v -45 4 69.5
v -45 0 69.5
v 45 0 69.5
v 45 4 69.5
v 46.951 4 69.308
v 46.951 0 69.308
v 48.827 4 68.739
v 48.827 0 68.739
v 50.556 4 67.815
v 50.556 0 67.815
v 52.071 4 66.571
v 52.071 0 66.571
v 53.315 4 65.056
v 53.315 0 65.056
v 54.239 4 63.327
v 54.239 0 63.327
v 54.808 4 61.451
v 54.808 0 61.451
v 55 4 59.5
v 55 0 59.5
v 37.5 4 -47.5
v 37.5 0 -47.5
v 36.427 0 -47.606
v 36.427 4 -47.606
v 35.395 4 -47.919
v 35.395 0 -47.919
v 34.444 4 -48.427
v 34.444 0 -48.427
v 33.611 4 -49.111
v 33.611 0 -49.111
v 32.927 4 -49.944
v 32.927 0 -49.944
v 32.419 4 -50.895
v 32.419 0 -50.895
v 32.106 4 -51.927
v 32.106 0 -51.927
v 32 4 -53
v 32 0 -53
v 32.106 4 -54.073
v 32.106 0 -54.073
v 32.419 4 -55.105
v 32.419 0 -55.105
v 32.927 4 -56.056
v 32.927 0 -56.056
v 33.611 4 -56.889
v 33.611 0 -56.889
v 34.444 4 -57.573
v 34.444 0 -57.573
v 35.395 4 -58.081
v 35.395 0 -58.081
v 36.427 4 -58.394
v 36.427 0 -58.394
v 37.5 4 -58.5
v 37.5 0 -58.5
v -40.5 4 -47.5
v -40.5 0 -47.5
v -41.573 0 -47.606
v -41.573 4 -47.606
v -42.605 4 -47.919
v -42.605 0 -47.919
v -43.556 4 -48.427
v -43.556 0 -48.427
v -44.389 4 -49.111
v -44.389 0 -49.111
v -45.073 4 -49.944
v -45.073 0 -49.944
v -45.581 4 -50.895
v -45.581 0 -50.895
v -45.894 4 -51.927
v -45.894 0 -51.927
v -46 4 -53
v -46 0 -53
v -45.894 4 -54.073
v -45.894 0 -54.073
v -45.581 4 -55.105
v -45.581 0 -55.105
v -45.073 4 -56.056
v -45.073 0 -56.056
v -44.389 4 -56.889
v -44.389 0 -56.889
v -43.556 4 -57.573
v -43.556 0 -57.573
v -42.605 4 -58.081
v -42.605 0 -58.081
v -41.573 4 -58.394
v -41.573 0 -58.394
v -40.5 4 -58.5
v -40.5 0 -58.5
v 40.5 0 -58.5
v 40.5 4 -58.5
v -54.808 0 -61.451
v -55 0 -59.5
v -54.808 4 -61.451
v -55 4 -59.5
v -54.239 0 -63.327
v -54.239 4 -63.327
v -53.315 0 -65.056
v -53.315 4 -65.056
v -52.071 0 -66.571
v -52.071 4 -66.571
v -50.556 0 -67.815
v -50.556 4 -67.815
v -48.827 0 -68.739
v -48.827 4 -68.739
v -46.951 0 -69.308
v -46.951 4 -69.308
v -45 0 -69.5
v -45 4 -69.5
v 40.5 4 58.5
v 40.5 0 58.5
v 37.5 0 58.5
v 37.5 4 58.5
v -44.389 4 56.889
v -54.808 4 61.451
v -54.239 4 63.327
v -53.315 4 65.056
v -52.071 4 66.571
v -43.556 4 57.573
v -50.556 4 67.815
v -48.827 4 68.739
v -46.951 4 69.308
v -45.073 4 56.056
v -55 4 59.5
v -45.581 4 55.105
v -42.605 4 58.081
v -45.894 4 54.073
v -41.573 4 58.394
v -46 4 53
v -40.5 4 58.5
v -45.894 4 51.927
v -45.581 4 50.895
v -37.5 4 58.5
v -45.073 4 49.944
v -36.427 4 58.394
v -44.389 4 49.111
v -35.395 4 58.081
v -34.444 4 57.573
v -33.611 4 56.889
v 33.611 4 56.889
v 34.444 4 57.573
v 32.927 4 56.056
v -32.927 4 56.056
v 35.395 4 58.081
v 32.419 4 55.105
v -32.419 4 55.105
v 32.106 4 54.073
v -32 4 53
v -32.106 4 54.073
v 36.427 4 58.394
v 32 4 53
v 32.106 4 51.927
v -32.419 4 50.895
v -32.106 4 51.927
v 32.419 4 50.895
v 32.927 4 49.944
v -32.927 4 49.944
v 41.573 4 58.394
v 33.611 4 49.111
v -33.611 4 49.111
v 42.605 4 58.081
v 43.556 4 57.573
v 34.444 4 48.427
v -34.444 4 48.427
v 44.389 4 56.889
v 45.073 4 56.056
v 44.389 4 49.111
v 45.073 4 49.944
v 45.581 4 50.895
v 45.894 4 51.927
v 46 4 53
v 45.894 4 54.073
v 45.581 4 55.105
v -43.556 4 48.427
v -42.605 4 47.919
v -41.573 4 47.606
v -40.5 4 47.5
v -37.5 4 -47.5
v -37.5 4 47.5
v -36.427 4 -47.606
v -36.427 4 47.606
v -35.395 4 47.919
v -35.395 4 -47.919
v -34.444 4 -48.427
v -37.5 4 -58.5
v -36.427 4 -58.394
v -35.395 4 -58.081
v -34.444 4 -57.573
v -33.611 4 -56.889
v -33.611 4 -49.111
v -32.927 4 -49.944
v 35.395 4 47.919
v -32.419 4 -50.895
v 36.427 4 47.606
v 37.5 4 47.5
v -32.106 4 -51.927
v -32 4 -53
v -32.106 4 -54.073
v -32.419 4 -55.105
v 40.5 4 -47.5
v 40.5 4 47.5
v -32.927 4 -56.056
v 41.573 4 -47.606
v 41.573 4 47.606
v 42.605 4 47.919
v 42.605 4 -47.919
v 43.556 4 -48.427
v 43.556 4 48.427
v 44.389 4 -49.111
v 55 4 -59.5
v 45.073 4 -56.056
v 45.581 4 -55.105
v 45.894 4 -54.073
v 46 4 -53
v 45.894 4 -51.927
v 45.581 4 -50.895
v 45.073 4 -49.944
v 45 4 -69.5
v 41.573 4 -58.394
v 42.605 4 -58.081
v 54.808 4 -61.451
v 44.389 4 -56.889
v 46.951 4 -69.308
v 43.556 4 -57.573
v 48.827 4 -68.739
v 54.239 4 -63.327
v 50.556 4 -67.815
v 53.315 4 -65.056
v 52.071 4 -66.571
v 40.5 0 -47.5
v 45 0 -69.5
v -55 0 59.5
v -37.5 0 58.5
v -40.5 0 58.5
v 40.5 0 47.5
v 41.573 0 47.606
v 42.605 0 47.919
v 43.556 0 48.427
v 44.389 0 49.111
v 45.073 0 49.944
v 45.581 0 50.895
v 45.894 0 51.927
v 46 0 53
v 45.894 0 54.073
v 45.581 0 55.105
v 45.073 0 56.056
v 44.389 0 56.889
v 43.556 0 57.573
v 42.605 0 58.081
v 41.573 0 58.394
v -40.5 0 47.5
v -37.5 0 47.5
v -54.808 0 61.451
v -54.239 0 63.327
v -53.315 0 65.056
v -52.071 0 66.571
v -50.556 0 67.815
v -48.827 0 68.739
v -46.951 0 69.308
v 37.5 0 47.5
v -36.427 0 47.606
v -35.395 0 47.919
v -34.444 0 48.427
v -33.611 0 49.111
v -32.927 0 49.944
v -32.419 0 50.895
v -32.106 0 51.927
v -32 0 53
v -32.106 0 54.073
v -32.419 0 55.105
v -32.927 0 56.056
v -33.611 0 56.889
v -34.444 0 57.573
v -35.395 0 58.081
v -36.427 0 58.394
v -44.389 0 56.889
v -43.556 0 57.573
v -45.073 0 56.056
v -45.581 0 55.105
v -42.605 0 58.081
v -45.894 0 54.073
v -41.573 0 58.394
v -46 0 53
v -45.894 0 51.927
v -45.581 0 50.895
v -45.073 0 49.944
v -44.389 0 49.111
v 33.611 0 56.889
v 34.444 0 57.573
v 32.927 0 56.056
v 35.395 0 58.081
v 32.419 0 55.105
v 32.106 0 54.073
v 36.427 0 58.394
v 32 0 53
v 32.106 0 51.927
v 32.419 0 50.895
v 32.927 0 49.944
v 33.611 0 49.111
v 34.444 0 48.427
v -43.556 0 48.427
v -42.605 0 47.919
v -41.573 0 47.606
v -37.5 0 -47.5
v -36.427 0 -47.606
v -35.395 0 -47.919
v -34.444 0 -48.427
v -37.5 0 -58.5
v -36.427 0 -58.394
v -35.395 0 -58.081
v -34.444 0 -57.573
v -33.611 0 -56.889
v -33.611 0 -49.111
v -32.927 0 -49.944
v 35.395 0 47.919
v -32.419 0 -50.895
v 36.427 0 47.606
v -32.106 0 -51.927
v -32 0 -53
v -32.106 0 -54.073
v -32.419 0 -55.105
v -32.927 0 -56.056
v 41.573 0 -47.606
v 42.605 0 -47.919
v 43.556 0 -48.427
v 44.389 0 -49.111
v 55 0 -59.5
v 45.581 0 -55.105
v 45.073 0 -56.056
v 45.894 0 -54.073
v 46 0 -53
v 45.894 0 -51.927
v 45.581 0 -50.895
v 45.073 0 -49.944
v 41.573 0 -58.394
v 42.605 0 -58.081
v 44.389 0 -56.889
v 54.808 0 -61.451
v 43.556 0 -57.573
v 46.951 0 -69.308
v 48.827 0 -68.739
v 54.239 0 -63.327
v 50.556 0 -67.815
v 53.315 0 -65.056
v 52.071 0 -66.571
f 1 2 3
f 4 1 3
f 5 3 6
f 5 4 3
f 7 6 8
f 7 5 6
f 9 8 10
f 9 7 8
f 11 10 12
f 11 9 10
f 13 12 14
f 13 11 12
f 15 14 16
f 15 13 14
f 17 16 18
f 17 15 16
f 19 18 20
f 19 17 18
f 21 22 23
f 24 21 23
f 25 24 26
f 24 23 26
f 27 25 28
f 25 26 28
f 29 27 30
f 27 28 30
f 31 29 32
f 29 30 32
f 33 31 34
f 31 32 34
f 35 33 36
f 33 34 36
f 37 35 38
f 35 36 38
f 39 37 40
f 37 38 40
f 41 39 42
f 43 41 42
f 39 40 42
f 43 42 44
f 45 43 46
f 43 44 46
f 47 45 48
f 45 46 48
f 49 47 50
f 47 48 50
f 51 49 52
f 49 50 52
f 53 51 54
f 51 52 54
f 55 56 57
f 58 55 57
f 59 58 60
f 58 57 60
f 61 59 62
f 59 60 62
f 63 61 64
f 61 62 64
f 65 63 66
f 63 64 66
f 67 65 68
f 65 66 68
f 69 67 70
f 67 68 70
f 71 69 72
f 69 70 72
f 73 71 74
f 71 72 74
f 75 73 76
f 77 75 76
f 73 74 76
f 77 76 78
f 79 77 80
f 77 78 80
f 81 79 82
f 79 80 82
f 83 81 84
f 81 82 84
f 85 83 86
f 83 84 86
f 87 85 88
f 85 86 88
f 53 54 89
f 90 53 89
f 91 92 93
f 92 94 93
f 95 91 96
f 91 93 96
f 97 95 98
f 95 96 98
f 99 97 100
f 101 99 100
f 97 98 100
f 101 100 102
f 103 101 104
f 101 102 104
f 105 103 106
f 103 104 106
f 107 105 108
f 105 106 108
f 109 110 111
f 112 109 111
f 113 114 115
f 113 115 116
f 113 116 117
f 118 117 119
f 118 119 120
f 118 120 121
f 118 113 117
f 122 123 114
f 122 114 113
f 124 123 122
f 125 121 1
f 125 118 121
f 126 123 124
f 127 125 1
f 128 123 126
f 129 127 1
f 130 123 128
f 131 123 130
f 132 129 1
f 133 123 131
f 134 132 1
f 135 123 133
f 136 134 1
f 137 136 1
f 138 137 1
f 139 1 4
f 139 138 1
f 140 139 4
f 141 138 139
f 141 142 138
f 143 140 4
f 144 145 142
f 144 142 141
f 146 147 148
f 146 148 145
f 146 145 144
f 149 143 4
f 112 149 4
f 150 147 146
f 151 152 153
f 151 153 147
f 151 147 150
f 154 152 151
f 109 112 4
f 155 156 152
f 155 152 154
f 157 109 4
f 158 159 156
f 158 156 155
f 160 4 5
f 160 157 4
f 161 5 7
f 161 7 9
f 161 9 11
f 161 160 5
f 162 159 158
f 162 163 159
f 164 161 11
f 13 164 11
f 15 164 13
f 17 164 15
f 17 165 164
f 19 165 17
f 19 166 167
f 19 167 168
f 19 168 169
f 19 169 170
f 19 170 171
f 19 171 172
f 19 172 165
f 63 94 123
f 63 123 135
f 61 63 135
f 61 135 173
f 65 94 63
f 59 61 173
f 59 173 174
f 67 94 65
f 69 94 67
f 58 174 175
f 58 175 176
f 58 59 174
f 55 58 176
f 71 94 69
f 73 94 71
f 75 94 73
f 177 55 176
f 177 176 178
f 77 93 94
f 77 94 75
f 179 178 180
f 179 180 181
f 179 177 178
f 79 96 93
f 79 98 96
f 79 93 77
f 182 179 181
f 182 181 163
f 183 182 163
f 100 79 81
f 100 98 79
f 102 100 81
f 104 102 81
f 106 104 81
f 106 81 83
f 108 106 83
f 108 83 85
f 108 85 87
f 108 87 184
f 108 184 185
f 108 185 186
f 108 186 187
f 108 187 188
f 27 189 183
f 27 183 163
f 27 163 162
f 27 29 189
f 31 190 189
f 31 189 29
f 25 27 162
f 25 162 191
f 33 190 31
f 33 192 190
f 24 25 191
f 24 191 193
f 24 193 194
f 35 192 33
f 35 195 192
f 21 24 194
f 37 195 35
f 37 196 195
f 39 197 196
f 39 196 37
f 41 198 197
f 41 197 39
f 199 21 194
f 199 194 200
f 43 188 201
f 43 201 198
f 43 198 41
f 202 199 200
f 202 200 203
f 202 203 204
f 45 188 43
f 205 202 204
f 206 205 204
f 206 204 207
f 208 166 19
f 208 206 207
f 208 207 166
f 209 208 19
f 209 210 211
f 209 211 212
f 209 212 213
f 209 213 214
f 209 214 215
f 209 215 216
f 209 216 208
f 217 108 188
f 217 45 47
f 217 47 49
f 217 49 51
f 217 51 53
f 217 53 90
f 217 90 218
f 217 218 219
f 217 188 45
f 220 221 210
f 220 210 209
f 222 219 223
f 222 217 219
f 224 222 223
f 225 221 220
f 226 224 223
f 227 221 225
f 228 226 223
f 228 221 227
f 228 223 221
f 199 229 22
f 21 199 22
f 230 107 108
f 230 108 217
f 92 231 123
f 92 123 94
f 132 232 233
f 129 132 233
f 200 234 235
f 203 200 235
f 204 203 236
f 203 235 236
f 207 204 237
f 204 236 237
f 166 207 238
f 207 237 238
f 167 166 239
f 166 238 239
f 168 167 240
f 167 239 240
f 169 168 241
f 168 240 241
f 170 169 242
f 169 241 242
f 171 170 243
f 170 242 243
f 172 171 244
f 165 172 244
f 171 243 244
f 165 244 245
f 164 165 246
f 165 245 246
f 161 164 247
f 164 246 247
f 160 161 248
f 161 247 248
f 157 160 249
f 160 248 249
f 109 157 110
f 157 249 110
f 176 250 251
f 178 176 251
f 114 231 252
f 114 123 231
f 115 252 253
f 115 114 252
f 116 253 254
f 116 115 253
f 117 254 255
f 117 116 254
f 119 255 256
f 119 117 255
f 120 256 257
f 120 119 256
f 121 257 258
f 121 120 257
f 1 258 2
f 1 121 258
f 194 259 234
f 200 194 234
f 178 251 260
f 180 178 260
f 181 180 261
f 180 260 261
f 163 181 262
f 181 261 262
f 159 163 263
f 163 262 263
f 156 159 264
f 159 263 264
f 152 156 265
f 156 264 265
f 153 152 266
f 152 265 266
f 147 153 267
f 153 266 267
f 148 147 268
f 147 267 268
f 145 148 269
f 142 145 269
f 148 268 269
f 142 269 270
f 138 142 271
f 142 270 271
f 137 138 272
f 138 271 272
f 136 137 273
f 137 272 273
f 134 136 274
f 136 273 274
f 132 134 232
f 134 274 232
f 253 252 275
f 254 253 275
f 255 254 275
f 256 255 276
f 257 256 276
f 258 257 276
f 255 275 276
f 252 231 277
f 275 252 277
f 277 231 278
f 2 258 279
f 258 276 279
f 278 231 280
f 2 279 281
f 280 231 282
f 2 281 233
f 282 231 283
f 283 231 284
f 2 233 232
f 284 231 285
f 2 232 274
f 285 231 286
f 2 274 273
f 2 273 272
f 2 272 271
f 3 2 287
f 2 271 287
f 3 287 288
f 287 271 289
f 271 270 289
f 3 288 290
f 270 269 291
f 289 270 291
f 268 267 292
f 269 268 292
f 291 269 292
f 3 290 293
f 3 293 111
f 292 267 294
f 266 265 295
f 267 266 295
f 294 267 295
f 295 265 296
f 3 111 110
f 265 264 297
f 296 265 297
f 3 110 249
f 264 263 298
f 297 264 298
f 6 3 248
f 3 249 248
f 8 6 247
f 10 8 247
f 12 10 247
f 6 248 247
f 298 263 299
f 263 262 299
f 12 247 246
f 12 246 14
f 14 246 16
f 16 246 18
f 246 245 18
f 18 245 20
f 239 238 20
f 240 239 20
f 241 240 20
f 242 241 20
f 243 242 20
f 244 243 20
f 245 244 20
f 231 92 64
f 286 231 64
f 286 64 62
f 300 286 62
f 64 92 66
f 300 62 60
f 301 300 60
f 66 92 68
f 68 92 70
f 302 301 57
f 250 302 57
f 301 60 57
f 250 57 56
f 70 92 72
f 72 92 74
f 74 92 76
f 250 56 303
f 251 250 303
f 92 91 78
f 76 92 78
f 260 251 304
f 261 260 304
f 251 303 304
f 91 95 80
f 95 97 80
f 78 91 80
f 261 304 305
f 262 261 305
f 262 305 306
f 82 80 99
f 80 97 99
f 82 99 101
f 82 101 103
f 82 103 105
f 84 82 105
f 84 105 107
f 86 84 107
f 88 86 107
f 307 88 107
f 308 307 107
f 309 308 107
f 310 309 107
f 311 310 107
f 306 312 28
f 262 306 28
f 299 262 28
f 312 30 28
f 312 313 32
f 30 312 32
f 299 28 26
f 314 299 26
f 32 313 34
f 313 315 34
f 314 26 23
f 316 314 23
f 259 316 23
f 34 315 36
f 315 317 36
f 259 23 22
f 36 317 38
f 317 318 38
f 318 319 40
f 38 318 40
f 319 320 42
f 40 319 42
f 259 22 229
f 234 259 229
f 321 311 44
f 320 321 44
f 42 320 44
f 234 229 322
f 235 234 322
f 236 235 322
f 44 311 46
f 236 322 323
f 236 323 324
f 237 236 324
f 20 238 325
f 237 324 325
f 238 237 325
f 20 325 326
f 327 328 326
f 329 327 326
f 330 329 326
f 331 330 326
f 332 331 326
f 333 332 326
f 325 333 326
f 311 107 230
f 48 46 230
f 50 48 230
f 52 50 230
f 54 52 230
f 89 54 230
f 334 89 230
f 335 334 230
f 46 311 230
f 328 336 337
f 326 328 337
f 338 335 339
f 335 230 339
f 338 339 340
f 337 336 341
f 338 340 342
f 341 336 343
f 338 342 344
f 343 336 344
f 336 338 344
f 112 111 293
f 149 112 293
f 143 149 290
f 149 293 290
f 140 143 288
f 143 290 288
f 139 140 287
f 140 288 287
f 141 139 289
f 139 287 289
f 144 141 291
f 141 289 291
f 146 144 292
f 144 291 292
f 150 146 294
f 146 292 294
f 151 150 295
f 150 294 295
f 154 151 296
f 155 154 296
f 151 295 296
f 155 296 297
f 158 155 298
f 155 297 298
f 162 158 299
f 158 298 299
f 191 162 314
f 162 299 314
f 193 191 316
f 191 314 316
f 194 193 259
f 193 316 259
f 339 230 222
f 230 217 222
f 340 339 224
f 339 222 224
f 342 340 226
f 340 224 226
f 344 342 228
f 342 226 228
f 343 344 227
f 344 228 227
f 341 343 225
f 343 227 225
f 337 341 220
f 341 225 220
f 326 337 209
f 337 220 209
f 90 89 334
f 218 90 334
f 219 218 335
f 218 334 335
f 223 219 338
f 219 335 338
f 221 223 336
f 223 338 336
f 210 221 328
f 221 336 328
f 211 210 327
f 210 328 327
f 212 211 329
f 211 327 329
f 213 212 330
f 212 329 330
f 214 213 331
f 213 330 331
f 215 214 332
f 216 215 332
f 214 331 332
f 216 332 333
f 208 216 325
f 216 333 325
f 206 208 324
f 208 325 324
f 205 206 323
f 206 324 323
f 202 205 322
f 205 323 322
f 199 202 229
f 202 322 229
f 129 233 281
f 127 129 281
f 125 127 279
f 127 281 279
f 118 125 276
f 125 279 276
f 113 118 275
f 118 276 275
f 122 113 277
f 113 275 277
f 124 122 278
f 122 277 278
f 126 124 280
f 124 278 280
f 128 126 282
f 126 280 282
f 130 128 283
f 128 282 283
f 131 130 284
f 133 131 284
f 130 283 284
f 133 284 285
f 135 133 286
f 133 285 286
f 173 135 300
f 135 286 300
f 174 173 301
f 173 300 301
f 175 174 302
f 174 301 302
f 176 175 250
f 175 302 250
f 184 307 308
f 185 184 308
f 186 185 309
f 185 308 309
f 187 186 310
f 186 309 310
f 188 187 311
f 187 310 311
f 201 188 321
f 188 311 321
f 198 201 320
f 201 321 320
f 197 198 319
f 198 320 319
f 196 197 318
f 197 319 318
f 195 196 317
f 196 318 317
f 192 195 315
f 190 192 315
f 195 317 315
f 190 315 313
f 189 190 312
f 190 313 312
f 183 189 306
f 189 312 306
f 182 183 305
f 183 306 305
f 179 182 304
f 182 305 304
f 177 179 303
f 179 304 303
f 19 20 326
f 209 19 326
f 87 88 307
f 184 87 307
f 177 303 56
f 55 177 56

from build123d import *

# Parameters (mm, degrees)
SKETCH1_W           = 110
SKETCH1_H           = 139
BOSS_EXTRUDE1_DEPTH = 4
FILLET1_R           = 10


with BuildPart() as part:
    # Sketch1 → Boss-Extrude1 (new body)
    with BuildSketch(Plane(origin=(0, 0, 0), x_dir=(1, 0, 0), z_dir=(0, 1, 0))):
        Rectangle(SKETCH1_W, SKETCH1_H)
        with BuildLine():
            Line((-40.5, 58.5), (-37.5, 58.5))
            ThreePointArc((-37.5, 58.5), (-32, 53), (-37.5, 47.5))
            Line((-37.5, 47.5), (-40.5, 47.5))
            ThreePointArc((-40.5, 47.5), (-46, 53), (-40.5, 58.5))
        make_face(mode=Mode.SUBTRACT)
        with BuildLine():
            Line((37.5, 58.5), (40.5, 58.5))
            ThreePointArc((40.5, 58.5), (46, 53), (40.5, 47.5))
            Line((40.5, 47.5), (37.5, 47.5))
            ThreePointArc((37.5, 47.5), (32, 53), (37.5, 58.5))
        make_face(mode=Mode.SUBTRACT)
        with BuildLine():
            Line((-40.5, -47.5), (-37.5, -47.5))
            ThreePointArc((-37.5, -47.5), (-32, -53), (-37.5, -58.5))
            Line((-37.5, -58.5), (-40.5, -58.5))
            ThreePointArc((-40.5, -58.5), (-46, -53), (-40.5, -47.5))
        make_face(mode=Mode.SUBTRACT)
        with BuildLine():
            Line((37.5, -47.5), (40.5, -47.5))
            ThreePointArc((40.5, -47.5), (46, -53), (40.5, -58.5))
            Line((40.5, -58.5), (37.5, -58.5))
            ThreePointArc((37.5, -58.5), (32, -53), (37.5, -47.5))
        make_face(mode=Mode.SUBTRACT)
    extrude(amount=BOSS_EXTRUDE1_DEPTH)

    # Fillet1
    fillet1_edges = [part.edges().sort_by_distance(p)[0] for p in [
        (55, 2, 69.5),
        (-55, 2, 69.5),
        (-55, 2, -69.5),
        (55, 2, -69.5),
    ]]
    fillet(fillet1_edges, radius=FILLET1_R)


solid = part.part
